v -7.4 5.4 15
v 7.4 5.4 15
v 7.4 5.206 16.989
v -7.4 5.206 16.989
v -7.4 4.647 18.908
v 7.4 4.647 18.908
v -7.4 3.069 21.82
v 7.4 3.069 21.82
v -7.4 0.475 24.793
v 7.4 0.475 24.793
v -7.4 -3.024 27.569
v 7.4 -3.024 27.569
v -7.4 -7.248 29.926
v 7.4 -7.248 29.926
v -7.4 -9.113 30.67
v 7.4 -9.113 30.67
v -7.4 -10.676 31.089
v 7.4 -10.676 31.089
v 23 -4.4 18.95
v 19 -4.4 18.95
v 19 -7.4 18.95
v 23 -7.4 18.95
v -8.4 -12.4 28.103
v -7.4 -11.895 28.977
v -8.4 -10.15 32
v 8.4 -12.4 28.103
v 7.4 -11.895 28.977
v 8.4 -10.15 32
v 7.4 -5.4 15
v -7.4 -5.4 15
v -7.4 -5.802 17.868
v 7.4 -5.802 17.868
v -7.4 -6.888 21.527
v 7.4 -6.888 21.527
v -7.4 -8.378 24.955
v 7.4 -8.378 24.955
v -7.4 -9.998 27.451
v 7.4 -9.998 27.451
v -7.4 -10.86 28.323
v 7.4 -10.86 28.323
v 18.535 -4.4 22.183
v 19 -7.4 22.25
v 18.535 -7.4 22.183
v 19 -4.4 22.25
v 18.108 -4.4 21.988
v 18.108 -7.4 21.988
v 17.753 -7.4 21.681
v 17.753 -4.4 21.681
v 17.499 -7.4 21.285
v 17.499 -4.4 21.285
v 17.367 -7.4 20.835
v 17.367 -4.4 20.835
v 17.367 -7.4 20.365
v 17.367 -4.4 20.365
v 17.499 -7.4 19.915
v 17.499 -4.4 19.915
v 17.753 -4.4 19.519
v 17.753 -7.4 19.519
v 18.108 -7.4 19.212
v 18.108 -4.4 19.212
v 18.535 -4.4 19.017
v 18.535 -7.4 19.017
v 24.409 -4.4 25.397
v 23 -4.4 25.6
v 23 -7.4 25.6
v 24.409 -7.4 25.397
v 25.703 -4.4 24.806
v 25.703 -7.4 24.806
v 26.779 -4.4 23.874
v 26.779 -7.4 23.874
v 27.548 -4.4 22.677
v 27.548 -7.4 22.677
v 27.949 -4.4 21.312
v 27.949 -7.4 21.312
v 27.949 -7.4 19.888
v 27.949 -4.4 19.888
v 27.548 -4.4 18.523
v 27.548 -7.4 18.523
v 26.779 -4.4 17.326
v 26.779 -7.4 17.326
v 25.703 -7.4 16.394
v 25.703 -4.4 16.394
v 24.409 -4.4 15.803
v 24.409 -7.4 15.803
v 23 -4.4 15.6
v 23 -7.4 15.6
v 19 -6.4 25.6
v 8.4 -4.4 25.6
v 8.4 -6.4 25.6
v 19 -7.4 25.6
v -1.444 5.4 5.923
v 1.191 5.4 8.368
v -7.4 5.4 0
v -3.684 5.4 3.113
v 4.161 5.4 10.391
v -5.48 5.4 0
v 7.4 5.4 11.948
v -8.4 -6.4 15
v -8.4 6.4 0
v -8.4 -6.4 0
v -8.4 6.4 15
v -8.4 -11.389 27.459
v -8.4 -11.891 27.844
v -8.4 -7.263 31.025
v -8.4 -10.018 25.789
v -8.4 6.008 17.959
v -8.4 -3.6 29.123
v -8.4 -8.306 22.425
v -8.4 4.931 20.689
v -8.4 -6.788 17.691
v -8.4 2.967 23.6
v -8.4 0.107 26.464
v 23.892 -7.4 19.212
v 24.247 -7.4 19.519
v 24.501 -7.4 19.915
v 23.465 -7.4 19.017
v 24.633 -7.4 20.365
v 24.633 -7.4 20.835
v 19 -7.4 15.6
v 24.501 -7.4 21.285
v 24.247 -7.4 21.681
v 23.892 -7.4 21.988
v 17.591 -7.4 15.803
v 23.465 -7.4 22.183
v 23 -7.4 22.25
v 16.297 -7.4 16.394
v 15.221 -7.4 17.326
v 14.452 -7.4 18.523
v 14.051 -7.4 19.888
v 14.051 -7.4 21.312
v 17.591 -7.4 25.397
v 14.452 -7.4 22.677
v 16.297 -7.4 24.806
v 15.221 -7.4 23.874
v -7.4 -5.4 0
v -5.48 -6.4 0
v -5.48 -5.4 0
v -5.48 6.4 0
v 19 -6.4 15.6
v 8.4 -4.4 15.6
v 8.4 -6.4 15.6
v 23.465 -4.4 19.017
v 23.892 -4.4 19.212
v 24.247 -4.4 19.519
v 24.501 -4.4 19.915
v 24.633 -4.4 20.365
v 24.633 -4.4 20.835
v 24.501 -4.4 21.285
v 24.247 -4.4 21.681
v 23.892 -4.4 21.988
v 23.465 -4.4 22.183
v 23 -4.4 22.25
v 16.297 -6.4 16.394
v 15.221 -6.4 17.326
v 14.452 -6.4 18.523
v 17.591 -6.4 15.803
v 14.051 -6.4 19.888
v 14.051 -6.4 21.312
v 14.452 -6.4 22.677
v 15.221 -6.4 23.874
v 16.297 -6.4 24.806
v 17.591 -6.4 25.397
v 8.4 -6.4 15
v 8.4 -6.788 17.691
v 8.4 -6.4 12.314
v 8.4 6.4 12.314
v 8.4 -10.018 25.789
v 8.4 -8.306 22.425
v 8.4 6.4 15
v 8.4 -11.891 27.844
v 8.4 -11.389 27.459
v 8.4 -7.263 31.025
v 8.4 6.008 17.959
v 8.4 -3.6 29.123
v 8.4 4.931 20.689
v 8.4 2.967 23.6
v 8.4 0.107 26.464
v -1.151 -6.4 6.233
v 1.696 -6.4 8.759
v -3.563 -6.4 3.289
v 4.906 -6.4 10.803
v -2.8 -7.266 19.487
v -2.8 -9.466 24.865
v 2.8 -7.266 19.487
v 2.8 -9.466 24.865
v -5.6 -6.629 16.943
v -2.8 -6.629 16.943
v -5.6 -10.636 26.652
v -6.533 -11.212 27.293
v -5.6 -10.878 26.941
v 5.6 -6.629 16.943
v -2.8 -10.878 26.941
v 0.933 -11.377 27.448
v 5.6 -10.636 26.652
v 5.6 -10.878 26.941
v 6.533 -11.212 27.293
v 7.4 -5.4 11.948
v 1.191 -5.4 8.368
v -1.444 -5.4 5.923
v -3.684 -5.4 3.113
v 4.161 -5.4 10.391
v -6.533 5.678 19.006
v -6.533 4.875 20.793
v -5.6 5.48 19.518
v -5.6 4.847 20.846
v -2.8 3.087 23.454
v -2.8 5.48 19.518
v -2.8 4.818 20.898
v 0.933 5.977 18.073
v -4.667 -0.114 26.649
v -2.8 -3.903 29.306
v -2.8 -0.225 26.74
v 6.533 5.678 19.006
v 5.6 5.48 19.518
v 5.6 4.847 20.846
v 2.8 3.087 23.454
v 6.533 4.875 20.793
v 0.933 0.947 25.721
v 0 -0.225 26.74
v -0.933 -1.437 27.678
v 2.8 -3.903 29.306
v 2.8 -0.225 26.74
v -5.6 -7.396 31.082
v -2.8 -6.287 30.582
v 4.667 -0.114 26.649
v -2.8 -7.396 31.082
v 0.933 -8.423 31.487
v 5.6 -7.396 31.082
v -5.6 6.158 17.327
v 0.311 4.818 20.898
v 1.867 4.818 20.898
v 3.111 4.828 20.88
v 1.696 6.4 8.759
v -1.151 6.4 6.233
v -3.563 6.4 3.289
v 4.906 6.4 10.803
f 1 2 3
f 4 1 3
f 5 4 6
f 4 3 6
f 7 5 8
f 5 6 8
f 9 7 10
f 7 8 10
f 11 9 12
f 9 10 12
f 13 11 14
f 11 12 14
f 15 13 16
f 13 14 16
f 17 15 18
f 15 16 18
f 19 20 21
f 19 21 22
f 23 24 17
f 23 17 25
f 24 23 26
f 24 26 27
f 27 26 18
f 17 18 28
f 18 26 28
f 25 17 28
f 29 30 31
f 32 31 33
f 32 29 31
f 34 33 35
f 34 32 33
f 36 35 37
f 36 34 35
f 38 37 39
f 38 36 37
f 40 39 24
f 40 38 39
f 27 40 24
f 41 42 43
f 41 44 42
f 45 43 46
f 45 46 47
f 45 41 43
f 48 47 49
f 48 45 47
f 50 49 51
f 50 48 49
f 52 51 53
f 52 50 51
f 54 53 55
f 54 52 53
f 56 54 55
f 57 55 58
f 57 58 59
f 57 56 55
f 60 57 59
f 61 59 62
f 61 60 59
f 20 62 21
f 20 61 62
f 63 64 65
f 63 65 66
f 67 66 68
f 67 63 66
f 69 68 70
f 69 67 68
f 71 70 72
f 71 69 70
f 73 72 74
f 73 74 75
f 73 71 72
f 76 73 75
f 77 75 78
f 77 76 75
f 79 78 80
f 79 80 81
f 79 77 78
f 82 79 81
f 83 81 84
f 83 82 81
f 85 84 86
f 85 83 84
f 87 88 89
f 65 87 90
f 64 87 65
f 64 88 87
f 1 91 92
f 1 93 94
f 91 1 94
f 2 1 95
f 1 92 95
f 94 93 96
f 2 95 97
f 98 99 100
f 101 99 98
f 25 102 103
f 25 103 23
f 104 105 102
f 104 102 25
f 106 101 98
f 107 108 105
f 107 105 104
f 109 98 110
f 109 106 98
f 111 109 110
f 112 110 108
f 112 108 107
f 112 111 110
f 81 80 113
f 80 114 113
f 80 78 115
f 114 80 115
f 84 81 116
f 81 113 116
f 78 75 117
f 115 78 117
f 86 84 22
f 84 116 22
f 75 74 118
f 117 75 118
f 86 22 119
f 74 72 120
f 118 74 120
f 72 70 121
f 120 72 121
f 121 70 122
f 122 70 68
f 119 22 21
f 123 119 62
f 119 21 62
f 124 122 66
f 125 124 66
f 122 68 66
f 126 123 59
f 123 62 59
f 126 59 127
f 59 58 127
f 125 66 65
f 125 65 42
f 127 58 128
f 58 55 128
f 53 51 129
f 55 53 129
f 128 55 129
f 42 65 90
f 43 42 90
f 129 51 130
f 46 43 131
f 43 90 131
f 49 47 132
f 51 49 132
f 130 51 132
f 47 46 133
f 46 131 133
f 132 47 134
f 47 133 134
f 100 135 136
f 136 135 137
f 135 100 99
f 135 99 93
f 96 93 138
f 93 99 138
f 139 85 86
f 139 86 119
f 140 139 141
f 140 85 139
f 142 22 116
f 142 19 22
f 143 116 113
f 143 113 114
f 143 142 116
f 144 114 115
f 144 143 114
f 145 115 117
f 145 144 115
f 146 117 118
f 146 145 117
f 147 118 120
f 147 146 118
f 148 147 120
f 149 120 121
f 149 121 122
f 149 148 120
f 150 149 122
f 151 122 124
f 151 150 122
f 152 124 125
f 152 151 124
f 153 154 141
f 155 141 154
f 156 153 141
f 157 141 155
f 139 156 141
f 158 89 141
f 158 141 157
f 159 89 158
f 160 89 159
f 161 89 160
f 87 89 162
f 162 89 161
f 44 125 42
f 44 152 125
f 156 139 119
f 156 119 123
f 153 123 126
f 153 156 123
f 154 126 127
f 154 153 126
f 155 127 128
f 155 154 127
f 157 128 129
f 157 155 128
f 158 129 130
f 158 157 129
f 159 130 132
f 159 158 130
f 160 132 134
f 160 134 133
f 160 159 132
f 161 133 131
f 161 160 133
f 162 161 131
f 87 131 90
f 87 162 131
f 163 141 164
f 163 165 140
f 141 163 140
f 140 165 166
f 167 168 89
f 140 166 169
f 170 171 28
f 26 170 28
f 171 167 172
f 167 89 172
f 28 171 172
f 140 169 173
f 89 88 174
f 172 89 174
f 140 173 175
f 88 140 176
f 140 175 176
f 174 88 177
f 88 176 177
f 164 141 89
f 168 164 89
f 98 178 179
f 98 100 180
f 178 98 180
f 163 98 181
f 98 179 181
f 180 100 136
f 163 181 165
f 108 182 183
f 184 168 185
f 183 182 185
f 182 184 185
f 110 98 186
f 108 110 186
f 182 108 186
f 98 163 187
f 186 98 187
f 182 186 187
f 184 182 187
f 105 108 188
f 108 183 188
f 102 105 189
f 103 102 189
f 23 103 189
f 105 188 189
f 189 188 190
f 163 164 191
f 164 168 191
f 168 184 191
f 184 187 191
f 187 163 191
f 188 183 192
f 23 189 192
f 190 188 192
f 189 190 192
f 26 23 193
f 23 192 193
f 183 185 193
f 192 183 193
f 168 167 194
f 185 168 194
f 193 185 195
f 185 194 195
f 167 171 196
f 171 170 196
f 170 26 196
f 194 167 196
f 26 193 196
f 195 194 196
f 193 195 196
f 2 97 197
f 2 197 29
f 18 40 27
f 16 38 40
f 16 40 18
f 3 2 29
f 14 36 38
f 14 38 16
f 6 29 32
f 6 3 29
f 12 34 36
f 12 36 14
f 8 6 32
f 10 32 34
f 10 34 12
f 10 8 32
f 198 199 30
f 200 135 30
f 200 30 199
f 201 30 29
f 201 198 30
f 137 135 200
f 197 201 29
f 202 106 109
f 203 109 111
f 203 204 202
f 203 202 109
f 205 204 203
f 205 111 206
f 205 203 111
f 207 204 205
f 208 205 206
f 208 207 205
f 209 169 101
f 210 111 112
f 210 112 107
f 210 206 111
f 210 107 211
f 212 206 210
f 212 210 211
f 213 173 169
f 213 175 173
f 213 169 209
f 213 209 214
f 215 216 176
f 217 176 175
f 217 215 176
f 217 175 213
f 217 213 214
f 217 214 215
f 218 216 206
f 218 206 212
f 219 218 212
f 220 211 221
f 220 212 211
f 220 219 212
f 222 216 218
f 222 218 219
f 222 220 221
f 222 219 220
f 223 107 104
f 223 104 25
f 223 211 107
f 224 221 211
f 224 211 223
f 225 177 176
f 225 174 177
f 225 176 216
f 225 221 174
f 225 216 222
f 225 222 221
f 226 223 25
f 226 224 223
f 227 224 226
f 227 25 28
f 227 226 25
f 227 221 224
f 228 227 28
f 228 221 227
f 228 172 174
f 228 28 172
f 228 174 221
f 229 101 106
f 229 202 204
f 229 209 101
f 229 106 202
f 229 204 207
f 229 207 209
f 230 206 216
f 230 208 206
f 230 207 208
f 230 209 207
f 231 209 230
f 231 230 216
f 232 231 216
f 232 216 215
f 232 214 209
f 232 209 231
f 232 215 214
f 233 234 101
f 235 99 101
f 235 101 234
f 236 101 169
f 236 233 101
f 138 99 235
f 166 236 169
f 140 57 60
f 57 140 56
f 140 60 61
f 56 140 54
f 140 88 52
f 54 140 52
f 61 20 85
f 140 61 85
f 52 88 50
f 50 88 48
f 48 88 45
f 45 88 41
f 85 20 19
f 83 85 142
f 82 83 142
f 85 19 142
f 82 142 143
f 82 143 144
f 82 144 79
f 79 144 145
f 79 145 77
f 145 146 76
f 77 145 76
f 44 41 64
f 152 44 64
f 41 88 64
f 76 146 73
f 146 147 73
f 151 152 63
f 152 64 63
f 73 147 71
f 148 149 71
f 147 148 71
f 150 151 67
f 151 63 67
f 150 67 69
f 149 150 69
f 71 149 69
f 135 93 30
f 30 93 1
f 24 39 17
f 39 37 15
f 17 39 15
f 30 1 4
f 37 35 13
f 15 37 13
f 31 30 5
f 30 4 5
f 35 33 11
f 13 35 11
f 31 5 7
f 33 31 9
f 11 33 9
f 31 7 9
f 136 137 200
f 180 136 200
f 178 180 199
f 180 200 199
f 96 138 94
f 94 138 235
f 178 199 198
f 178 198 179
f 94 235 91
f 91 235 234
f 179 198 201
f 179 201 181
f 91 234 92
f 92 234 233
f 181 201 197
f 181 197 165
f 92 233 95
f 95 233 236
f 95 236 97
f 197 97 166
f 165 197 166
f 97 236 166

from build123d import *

# Parameters (mm, degrees)
ESBO_O1_W                = 16.8
ESBO_O1_H                = 12.8
RESSALTO_EXTRUS_O1_DEPTH = 15
RESSALTO_EXTRUS_O2_DEPTH = 16.8
CASCA1_T                 = -1
ESBO_O5_R                = 24
CORTE_EXTRUS_O1_DEPTH    = 19.8000001
RESSALTO_EXTRUS_O3_DEPTH = 2
RESSALTO_EXTRUS_O4_DEPTH = 1


with BuildPart() as part:
    # Esboço1 → Ressalto-extrusão1 (new body)
    with BuildSketch(Plane.XY):
        Rectangle(ESBO_O1_W, ESBO_O1_H)
    extrude(amount=RESSALTO_EXTRUS_O1_DEPTH)

    # Esboço2 → Ressalto-extrusão2 (add, through all)
    with BuildSketch(Plane(origin=(8.4, 0, 0), x_dir=(0, 0, -1), z_dir=(1, 0, 0))):
        with BuildLine():
            Line((-28.102885683, -12.4), (-32, -10.15))
            add(Edge.make_bspline(
                [(-15, 6.4), (-24.5700068, 6.4), (-31.06930524, -5.749171672), (-32, -10.15)],
                knots=[0, 0, 0, 0, 1, 1, 1, 1], degree=3))
            Line((-15, 6.4), (-15, -6.4))
            add(Edge.make_bspline(
                [(-15, -6.4), (-18.032161103, -6.4), (-26.944769552, -9.297903221), (-28.102885683, -12.4)],
                knots=[0, 0, 0, 0, 1, 1, 1, 1], degree=3))
        make_face()
    extrude(amount=-RESSALTO_EXTRUS_O2_DEPTH)

    # Casca1
    casca1_openings = [part.faces().sort_by_distance(p)[0] for p in [
        (0, -11.275, 30.051442841),
        (0, 0, 0),
    ]]
    offset(amount=CASCA1_T, openings=casca1_openings)

    # Esboço5 → Corte-extrusão1 (cut, through all)
    with BuildSketch(Plane(origin=(0, 6.4, 0), x_dir=(1, 0, 0), z_dir=(0, 1, 0))):
        with Locations((16.15, 10.4)):
            Circle(ESBO_O5_R)
    extrude(amount=-CORTE_EXTRUS_O1_DEPTH, mode=Mode.SUBTRACT)

    # Esboço6 → Ressalto-extrusão3 (add)
    with BuildSketch(Plane.XZ.offset(6.4)):
        with BuildLine():
            Line((23, 25.6), (8.4, 25.6))
            Line((8.4, 25.6), (8.4, 15.6))
            Line((8.4, 15.6), (23, 15.6))
            ThreePointArc((23, 15.6), (28, 20.6), (23, 25.6))
        make_face()
        with BuildLine():
            Line((19, 22.25), (23, 22.25))
            ThreePointArc((23, 22.25), (24.65, 20.6), (23, 18.95))
            Line((23, 18.95), (19, 18.95))
            ThreePointArc((19, 18.95), (17.35, 20.6), (19, 22.25))
        make_face(mode=Mode.SUBTRACT)
    extrude(amount=-RESSALTO_EXTRUS_O3_DEPTH)

    # Esboço7 → Ressalto-extrusão4 (add)
    with BuildSketch(Plane.XZ.offset(6.4)):
        with BuildLine():
            Line((19, 25.6), (23, 25.6))
            ThreePointArc((23, 25.6), (28, 20.6), (23, 15.6))
            Line((23, 15.6), (19, 15.6))
            ThreePointArc((19, 15.6), (14, 20.6), (19, 25.6))
        make_face()
        with BuildLine():
            Line((19, 18.95), (23, 18.95))
            ThreePointArc((23, 18.95), (24.65, 20.6), (23, 22.25))
            Line((23, 22.25), (19, 22.25))
            ThreePointArc((19, 22.25), (17.35, 20.6), (19, 18.95))
        make_face(mode=Mode.SUBTRACT)
    extrude(amount=RESSALTO_EXTRUS_O4_DEPTH)


solid = part.part
